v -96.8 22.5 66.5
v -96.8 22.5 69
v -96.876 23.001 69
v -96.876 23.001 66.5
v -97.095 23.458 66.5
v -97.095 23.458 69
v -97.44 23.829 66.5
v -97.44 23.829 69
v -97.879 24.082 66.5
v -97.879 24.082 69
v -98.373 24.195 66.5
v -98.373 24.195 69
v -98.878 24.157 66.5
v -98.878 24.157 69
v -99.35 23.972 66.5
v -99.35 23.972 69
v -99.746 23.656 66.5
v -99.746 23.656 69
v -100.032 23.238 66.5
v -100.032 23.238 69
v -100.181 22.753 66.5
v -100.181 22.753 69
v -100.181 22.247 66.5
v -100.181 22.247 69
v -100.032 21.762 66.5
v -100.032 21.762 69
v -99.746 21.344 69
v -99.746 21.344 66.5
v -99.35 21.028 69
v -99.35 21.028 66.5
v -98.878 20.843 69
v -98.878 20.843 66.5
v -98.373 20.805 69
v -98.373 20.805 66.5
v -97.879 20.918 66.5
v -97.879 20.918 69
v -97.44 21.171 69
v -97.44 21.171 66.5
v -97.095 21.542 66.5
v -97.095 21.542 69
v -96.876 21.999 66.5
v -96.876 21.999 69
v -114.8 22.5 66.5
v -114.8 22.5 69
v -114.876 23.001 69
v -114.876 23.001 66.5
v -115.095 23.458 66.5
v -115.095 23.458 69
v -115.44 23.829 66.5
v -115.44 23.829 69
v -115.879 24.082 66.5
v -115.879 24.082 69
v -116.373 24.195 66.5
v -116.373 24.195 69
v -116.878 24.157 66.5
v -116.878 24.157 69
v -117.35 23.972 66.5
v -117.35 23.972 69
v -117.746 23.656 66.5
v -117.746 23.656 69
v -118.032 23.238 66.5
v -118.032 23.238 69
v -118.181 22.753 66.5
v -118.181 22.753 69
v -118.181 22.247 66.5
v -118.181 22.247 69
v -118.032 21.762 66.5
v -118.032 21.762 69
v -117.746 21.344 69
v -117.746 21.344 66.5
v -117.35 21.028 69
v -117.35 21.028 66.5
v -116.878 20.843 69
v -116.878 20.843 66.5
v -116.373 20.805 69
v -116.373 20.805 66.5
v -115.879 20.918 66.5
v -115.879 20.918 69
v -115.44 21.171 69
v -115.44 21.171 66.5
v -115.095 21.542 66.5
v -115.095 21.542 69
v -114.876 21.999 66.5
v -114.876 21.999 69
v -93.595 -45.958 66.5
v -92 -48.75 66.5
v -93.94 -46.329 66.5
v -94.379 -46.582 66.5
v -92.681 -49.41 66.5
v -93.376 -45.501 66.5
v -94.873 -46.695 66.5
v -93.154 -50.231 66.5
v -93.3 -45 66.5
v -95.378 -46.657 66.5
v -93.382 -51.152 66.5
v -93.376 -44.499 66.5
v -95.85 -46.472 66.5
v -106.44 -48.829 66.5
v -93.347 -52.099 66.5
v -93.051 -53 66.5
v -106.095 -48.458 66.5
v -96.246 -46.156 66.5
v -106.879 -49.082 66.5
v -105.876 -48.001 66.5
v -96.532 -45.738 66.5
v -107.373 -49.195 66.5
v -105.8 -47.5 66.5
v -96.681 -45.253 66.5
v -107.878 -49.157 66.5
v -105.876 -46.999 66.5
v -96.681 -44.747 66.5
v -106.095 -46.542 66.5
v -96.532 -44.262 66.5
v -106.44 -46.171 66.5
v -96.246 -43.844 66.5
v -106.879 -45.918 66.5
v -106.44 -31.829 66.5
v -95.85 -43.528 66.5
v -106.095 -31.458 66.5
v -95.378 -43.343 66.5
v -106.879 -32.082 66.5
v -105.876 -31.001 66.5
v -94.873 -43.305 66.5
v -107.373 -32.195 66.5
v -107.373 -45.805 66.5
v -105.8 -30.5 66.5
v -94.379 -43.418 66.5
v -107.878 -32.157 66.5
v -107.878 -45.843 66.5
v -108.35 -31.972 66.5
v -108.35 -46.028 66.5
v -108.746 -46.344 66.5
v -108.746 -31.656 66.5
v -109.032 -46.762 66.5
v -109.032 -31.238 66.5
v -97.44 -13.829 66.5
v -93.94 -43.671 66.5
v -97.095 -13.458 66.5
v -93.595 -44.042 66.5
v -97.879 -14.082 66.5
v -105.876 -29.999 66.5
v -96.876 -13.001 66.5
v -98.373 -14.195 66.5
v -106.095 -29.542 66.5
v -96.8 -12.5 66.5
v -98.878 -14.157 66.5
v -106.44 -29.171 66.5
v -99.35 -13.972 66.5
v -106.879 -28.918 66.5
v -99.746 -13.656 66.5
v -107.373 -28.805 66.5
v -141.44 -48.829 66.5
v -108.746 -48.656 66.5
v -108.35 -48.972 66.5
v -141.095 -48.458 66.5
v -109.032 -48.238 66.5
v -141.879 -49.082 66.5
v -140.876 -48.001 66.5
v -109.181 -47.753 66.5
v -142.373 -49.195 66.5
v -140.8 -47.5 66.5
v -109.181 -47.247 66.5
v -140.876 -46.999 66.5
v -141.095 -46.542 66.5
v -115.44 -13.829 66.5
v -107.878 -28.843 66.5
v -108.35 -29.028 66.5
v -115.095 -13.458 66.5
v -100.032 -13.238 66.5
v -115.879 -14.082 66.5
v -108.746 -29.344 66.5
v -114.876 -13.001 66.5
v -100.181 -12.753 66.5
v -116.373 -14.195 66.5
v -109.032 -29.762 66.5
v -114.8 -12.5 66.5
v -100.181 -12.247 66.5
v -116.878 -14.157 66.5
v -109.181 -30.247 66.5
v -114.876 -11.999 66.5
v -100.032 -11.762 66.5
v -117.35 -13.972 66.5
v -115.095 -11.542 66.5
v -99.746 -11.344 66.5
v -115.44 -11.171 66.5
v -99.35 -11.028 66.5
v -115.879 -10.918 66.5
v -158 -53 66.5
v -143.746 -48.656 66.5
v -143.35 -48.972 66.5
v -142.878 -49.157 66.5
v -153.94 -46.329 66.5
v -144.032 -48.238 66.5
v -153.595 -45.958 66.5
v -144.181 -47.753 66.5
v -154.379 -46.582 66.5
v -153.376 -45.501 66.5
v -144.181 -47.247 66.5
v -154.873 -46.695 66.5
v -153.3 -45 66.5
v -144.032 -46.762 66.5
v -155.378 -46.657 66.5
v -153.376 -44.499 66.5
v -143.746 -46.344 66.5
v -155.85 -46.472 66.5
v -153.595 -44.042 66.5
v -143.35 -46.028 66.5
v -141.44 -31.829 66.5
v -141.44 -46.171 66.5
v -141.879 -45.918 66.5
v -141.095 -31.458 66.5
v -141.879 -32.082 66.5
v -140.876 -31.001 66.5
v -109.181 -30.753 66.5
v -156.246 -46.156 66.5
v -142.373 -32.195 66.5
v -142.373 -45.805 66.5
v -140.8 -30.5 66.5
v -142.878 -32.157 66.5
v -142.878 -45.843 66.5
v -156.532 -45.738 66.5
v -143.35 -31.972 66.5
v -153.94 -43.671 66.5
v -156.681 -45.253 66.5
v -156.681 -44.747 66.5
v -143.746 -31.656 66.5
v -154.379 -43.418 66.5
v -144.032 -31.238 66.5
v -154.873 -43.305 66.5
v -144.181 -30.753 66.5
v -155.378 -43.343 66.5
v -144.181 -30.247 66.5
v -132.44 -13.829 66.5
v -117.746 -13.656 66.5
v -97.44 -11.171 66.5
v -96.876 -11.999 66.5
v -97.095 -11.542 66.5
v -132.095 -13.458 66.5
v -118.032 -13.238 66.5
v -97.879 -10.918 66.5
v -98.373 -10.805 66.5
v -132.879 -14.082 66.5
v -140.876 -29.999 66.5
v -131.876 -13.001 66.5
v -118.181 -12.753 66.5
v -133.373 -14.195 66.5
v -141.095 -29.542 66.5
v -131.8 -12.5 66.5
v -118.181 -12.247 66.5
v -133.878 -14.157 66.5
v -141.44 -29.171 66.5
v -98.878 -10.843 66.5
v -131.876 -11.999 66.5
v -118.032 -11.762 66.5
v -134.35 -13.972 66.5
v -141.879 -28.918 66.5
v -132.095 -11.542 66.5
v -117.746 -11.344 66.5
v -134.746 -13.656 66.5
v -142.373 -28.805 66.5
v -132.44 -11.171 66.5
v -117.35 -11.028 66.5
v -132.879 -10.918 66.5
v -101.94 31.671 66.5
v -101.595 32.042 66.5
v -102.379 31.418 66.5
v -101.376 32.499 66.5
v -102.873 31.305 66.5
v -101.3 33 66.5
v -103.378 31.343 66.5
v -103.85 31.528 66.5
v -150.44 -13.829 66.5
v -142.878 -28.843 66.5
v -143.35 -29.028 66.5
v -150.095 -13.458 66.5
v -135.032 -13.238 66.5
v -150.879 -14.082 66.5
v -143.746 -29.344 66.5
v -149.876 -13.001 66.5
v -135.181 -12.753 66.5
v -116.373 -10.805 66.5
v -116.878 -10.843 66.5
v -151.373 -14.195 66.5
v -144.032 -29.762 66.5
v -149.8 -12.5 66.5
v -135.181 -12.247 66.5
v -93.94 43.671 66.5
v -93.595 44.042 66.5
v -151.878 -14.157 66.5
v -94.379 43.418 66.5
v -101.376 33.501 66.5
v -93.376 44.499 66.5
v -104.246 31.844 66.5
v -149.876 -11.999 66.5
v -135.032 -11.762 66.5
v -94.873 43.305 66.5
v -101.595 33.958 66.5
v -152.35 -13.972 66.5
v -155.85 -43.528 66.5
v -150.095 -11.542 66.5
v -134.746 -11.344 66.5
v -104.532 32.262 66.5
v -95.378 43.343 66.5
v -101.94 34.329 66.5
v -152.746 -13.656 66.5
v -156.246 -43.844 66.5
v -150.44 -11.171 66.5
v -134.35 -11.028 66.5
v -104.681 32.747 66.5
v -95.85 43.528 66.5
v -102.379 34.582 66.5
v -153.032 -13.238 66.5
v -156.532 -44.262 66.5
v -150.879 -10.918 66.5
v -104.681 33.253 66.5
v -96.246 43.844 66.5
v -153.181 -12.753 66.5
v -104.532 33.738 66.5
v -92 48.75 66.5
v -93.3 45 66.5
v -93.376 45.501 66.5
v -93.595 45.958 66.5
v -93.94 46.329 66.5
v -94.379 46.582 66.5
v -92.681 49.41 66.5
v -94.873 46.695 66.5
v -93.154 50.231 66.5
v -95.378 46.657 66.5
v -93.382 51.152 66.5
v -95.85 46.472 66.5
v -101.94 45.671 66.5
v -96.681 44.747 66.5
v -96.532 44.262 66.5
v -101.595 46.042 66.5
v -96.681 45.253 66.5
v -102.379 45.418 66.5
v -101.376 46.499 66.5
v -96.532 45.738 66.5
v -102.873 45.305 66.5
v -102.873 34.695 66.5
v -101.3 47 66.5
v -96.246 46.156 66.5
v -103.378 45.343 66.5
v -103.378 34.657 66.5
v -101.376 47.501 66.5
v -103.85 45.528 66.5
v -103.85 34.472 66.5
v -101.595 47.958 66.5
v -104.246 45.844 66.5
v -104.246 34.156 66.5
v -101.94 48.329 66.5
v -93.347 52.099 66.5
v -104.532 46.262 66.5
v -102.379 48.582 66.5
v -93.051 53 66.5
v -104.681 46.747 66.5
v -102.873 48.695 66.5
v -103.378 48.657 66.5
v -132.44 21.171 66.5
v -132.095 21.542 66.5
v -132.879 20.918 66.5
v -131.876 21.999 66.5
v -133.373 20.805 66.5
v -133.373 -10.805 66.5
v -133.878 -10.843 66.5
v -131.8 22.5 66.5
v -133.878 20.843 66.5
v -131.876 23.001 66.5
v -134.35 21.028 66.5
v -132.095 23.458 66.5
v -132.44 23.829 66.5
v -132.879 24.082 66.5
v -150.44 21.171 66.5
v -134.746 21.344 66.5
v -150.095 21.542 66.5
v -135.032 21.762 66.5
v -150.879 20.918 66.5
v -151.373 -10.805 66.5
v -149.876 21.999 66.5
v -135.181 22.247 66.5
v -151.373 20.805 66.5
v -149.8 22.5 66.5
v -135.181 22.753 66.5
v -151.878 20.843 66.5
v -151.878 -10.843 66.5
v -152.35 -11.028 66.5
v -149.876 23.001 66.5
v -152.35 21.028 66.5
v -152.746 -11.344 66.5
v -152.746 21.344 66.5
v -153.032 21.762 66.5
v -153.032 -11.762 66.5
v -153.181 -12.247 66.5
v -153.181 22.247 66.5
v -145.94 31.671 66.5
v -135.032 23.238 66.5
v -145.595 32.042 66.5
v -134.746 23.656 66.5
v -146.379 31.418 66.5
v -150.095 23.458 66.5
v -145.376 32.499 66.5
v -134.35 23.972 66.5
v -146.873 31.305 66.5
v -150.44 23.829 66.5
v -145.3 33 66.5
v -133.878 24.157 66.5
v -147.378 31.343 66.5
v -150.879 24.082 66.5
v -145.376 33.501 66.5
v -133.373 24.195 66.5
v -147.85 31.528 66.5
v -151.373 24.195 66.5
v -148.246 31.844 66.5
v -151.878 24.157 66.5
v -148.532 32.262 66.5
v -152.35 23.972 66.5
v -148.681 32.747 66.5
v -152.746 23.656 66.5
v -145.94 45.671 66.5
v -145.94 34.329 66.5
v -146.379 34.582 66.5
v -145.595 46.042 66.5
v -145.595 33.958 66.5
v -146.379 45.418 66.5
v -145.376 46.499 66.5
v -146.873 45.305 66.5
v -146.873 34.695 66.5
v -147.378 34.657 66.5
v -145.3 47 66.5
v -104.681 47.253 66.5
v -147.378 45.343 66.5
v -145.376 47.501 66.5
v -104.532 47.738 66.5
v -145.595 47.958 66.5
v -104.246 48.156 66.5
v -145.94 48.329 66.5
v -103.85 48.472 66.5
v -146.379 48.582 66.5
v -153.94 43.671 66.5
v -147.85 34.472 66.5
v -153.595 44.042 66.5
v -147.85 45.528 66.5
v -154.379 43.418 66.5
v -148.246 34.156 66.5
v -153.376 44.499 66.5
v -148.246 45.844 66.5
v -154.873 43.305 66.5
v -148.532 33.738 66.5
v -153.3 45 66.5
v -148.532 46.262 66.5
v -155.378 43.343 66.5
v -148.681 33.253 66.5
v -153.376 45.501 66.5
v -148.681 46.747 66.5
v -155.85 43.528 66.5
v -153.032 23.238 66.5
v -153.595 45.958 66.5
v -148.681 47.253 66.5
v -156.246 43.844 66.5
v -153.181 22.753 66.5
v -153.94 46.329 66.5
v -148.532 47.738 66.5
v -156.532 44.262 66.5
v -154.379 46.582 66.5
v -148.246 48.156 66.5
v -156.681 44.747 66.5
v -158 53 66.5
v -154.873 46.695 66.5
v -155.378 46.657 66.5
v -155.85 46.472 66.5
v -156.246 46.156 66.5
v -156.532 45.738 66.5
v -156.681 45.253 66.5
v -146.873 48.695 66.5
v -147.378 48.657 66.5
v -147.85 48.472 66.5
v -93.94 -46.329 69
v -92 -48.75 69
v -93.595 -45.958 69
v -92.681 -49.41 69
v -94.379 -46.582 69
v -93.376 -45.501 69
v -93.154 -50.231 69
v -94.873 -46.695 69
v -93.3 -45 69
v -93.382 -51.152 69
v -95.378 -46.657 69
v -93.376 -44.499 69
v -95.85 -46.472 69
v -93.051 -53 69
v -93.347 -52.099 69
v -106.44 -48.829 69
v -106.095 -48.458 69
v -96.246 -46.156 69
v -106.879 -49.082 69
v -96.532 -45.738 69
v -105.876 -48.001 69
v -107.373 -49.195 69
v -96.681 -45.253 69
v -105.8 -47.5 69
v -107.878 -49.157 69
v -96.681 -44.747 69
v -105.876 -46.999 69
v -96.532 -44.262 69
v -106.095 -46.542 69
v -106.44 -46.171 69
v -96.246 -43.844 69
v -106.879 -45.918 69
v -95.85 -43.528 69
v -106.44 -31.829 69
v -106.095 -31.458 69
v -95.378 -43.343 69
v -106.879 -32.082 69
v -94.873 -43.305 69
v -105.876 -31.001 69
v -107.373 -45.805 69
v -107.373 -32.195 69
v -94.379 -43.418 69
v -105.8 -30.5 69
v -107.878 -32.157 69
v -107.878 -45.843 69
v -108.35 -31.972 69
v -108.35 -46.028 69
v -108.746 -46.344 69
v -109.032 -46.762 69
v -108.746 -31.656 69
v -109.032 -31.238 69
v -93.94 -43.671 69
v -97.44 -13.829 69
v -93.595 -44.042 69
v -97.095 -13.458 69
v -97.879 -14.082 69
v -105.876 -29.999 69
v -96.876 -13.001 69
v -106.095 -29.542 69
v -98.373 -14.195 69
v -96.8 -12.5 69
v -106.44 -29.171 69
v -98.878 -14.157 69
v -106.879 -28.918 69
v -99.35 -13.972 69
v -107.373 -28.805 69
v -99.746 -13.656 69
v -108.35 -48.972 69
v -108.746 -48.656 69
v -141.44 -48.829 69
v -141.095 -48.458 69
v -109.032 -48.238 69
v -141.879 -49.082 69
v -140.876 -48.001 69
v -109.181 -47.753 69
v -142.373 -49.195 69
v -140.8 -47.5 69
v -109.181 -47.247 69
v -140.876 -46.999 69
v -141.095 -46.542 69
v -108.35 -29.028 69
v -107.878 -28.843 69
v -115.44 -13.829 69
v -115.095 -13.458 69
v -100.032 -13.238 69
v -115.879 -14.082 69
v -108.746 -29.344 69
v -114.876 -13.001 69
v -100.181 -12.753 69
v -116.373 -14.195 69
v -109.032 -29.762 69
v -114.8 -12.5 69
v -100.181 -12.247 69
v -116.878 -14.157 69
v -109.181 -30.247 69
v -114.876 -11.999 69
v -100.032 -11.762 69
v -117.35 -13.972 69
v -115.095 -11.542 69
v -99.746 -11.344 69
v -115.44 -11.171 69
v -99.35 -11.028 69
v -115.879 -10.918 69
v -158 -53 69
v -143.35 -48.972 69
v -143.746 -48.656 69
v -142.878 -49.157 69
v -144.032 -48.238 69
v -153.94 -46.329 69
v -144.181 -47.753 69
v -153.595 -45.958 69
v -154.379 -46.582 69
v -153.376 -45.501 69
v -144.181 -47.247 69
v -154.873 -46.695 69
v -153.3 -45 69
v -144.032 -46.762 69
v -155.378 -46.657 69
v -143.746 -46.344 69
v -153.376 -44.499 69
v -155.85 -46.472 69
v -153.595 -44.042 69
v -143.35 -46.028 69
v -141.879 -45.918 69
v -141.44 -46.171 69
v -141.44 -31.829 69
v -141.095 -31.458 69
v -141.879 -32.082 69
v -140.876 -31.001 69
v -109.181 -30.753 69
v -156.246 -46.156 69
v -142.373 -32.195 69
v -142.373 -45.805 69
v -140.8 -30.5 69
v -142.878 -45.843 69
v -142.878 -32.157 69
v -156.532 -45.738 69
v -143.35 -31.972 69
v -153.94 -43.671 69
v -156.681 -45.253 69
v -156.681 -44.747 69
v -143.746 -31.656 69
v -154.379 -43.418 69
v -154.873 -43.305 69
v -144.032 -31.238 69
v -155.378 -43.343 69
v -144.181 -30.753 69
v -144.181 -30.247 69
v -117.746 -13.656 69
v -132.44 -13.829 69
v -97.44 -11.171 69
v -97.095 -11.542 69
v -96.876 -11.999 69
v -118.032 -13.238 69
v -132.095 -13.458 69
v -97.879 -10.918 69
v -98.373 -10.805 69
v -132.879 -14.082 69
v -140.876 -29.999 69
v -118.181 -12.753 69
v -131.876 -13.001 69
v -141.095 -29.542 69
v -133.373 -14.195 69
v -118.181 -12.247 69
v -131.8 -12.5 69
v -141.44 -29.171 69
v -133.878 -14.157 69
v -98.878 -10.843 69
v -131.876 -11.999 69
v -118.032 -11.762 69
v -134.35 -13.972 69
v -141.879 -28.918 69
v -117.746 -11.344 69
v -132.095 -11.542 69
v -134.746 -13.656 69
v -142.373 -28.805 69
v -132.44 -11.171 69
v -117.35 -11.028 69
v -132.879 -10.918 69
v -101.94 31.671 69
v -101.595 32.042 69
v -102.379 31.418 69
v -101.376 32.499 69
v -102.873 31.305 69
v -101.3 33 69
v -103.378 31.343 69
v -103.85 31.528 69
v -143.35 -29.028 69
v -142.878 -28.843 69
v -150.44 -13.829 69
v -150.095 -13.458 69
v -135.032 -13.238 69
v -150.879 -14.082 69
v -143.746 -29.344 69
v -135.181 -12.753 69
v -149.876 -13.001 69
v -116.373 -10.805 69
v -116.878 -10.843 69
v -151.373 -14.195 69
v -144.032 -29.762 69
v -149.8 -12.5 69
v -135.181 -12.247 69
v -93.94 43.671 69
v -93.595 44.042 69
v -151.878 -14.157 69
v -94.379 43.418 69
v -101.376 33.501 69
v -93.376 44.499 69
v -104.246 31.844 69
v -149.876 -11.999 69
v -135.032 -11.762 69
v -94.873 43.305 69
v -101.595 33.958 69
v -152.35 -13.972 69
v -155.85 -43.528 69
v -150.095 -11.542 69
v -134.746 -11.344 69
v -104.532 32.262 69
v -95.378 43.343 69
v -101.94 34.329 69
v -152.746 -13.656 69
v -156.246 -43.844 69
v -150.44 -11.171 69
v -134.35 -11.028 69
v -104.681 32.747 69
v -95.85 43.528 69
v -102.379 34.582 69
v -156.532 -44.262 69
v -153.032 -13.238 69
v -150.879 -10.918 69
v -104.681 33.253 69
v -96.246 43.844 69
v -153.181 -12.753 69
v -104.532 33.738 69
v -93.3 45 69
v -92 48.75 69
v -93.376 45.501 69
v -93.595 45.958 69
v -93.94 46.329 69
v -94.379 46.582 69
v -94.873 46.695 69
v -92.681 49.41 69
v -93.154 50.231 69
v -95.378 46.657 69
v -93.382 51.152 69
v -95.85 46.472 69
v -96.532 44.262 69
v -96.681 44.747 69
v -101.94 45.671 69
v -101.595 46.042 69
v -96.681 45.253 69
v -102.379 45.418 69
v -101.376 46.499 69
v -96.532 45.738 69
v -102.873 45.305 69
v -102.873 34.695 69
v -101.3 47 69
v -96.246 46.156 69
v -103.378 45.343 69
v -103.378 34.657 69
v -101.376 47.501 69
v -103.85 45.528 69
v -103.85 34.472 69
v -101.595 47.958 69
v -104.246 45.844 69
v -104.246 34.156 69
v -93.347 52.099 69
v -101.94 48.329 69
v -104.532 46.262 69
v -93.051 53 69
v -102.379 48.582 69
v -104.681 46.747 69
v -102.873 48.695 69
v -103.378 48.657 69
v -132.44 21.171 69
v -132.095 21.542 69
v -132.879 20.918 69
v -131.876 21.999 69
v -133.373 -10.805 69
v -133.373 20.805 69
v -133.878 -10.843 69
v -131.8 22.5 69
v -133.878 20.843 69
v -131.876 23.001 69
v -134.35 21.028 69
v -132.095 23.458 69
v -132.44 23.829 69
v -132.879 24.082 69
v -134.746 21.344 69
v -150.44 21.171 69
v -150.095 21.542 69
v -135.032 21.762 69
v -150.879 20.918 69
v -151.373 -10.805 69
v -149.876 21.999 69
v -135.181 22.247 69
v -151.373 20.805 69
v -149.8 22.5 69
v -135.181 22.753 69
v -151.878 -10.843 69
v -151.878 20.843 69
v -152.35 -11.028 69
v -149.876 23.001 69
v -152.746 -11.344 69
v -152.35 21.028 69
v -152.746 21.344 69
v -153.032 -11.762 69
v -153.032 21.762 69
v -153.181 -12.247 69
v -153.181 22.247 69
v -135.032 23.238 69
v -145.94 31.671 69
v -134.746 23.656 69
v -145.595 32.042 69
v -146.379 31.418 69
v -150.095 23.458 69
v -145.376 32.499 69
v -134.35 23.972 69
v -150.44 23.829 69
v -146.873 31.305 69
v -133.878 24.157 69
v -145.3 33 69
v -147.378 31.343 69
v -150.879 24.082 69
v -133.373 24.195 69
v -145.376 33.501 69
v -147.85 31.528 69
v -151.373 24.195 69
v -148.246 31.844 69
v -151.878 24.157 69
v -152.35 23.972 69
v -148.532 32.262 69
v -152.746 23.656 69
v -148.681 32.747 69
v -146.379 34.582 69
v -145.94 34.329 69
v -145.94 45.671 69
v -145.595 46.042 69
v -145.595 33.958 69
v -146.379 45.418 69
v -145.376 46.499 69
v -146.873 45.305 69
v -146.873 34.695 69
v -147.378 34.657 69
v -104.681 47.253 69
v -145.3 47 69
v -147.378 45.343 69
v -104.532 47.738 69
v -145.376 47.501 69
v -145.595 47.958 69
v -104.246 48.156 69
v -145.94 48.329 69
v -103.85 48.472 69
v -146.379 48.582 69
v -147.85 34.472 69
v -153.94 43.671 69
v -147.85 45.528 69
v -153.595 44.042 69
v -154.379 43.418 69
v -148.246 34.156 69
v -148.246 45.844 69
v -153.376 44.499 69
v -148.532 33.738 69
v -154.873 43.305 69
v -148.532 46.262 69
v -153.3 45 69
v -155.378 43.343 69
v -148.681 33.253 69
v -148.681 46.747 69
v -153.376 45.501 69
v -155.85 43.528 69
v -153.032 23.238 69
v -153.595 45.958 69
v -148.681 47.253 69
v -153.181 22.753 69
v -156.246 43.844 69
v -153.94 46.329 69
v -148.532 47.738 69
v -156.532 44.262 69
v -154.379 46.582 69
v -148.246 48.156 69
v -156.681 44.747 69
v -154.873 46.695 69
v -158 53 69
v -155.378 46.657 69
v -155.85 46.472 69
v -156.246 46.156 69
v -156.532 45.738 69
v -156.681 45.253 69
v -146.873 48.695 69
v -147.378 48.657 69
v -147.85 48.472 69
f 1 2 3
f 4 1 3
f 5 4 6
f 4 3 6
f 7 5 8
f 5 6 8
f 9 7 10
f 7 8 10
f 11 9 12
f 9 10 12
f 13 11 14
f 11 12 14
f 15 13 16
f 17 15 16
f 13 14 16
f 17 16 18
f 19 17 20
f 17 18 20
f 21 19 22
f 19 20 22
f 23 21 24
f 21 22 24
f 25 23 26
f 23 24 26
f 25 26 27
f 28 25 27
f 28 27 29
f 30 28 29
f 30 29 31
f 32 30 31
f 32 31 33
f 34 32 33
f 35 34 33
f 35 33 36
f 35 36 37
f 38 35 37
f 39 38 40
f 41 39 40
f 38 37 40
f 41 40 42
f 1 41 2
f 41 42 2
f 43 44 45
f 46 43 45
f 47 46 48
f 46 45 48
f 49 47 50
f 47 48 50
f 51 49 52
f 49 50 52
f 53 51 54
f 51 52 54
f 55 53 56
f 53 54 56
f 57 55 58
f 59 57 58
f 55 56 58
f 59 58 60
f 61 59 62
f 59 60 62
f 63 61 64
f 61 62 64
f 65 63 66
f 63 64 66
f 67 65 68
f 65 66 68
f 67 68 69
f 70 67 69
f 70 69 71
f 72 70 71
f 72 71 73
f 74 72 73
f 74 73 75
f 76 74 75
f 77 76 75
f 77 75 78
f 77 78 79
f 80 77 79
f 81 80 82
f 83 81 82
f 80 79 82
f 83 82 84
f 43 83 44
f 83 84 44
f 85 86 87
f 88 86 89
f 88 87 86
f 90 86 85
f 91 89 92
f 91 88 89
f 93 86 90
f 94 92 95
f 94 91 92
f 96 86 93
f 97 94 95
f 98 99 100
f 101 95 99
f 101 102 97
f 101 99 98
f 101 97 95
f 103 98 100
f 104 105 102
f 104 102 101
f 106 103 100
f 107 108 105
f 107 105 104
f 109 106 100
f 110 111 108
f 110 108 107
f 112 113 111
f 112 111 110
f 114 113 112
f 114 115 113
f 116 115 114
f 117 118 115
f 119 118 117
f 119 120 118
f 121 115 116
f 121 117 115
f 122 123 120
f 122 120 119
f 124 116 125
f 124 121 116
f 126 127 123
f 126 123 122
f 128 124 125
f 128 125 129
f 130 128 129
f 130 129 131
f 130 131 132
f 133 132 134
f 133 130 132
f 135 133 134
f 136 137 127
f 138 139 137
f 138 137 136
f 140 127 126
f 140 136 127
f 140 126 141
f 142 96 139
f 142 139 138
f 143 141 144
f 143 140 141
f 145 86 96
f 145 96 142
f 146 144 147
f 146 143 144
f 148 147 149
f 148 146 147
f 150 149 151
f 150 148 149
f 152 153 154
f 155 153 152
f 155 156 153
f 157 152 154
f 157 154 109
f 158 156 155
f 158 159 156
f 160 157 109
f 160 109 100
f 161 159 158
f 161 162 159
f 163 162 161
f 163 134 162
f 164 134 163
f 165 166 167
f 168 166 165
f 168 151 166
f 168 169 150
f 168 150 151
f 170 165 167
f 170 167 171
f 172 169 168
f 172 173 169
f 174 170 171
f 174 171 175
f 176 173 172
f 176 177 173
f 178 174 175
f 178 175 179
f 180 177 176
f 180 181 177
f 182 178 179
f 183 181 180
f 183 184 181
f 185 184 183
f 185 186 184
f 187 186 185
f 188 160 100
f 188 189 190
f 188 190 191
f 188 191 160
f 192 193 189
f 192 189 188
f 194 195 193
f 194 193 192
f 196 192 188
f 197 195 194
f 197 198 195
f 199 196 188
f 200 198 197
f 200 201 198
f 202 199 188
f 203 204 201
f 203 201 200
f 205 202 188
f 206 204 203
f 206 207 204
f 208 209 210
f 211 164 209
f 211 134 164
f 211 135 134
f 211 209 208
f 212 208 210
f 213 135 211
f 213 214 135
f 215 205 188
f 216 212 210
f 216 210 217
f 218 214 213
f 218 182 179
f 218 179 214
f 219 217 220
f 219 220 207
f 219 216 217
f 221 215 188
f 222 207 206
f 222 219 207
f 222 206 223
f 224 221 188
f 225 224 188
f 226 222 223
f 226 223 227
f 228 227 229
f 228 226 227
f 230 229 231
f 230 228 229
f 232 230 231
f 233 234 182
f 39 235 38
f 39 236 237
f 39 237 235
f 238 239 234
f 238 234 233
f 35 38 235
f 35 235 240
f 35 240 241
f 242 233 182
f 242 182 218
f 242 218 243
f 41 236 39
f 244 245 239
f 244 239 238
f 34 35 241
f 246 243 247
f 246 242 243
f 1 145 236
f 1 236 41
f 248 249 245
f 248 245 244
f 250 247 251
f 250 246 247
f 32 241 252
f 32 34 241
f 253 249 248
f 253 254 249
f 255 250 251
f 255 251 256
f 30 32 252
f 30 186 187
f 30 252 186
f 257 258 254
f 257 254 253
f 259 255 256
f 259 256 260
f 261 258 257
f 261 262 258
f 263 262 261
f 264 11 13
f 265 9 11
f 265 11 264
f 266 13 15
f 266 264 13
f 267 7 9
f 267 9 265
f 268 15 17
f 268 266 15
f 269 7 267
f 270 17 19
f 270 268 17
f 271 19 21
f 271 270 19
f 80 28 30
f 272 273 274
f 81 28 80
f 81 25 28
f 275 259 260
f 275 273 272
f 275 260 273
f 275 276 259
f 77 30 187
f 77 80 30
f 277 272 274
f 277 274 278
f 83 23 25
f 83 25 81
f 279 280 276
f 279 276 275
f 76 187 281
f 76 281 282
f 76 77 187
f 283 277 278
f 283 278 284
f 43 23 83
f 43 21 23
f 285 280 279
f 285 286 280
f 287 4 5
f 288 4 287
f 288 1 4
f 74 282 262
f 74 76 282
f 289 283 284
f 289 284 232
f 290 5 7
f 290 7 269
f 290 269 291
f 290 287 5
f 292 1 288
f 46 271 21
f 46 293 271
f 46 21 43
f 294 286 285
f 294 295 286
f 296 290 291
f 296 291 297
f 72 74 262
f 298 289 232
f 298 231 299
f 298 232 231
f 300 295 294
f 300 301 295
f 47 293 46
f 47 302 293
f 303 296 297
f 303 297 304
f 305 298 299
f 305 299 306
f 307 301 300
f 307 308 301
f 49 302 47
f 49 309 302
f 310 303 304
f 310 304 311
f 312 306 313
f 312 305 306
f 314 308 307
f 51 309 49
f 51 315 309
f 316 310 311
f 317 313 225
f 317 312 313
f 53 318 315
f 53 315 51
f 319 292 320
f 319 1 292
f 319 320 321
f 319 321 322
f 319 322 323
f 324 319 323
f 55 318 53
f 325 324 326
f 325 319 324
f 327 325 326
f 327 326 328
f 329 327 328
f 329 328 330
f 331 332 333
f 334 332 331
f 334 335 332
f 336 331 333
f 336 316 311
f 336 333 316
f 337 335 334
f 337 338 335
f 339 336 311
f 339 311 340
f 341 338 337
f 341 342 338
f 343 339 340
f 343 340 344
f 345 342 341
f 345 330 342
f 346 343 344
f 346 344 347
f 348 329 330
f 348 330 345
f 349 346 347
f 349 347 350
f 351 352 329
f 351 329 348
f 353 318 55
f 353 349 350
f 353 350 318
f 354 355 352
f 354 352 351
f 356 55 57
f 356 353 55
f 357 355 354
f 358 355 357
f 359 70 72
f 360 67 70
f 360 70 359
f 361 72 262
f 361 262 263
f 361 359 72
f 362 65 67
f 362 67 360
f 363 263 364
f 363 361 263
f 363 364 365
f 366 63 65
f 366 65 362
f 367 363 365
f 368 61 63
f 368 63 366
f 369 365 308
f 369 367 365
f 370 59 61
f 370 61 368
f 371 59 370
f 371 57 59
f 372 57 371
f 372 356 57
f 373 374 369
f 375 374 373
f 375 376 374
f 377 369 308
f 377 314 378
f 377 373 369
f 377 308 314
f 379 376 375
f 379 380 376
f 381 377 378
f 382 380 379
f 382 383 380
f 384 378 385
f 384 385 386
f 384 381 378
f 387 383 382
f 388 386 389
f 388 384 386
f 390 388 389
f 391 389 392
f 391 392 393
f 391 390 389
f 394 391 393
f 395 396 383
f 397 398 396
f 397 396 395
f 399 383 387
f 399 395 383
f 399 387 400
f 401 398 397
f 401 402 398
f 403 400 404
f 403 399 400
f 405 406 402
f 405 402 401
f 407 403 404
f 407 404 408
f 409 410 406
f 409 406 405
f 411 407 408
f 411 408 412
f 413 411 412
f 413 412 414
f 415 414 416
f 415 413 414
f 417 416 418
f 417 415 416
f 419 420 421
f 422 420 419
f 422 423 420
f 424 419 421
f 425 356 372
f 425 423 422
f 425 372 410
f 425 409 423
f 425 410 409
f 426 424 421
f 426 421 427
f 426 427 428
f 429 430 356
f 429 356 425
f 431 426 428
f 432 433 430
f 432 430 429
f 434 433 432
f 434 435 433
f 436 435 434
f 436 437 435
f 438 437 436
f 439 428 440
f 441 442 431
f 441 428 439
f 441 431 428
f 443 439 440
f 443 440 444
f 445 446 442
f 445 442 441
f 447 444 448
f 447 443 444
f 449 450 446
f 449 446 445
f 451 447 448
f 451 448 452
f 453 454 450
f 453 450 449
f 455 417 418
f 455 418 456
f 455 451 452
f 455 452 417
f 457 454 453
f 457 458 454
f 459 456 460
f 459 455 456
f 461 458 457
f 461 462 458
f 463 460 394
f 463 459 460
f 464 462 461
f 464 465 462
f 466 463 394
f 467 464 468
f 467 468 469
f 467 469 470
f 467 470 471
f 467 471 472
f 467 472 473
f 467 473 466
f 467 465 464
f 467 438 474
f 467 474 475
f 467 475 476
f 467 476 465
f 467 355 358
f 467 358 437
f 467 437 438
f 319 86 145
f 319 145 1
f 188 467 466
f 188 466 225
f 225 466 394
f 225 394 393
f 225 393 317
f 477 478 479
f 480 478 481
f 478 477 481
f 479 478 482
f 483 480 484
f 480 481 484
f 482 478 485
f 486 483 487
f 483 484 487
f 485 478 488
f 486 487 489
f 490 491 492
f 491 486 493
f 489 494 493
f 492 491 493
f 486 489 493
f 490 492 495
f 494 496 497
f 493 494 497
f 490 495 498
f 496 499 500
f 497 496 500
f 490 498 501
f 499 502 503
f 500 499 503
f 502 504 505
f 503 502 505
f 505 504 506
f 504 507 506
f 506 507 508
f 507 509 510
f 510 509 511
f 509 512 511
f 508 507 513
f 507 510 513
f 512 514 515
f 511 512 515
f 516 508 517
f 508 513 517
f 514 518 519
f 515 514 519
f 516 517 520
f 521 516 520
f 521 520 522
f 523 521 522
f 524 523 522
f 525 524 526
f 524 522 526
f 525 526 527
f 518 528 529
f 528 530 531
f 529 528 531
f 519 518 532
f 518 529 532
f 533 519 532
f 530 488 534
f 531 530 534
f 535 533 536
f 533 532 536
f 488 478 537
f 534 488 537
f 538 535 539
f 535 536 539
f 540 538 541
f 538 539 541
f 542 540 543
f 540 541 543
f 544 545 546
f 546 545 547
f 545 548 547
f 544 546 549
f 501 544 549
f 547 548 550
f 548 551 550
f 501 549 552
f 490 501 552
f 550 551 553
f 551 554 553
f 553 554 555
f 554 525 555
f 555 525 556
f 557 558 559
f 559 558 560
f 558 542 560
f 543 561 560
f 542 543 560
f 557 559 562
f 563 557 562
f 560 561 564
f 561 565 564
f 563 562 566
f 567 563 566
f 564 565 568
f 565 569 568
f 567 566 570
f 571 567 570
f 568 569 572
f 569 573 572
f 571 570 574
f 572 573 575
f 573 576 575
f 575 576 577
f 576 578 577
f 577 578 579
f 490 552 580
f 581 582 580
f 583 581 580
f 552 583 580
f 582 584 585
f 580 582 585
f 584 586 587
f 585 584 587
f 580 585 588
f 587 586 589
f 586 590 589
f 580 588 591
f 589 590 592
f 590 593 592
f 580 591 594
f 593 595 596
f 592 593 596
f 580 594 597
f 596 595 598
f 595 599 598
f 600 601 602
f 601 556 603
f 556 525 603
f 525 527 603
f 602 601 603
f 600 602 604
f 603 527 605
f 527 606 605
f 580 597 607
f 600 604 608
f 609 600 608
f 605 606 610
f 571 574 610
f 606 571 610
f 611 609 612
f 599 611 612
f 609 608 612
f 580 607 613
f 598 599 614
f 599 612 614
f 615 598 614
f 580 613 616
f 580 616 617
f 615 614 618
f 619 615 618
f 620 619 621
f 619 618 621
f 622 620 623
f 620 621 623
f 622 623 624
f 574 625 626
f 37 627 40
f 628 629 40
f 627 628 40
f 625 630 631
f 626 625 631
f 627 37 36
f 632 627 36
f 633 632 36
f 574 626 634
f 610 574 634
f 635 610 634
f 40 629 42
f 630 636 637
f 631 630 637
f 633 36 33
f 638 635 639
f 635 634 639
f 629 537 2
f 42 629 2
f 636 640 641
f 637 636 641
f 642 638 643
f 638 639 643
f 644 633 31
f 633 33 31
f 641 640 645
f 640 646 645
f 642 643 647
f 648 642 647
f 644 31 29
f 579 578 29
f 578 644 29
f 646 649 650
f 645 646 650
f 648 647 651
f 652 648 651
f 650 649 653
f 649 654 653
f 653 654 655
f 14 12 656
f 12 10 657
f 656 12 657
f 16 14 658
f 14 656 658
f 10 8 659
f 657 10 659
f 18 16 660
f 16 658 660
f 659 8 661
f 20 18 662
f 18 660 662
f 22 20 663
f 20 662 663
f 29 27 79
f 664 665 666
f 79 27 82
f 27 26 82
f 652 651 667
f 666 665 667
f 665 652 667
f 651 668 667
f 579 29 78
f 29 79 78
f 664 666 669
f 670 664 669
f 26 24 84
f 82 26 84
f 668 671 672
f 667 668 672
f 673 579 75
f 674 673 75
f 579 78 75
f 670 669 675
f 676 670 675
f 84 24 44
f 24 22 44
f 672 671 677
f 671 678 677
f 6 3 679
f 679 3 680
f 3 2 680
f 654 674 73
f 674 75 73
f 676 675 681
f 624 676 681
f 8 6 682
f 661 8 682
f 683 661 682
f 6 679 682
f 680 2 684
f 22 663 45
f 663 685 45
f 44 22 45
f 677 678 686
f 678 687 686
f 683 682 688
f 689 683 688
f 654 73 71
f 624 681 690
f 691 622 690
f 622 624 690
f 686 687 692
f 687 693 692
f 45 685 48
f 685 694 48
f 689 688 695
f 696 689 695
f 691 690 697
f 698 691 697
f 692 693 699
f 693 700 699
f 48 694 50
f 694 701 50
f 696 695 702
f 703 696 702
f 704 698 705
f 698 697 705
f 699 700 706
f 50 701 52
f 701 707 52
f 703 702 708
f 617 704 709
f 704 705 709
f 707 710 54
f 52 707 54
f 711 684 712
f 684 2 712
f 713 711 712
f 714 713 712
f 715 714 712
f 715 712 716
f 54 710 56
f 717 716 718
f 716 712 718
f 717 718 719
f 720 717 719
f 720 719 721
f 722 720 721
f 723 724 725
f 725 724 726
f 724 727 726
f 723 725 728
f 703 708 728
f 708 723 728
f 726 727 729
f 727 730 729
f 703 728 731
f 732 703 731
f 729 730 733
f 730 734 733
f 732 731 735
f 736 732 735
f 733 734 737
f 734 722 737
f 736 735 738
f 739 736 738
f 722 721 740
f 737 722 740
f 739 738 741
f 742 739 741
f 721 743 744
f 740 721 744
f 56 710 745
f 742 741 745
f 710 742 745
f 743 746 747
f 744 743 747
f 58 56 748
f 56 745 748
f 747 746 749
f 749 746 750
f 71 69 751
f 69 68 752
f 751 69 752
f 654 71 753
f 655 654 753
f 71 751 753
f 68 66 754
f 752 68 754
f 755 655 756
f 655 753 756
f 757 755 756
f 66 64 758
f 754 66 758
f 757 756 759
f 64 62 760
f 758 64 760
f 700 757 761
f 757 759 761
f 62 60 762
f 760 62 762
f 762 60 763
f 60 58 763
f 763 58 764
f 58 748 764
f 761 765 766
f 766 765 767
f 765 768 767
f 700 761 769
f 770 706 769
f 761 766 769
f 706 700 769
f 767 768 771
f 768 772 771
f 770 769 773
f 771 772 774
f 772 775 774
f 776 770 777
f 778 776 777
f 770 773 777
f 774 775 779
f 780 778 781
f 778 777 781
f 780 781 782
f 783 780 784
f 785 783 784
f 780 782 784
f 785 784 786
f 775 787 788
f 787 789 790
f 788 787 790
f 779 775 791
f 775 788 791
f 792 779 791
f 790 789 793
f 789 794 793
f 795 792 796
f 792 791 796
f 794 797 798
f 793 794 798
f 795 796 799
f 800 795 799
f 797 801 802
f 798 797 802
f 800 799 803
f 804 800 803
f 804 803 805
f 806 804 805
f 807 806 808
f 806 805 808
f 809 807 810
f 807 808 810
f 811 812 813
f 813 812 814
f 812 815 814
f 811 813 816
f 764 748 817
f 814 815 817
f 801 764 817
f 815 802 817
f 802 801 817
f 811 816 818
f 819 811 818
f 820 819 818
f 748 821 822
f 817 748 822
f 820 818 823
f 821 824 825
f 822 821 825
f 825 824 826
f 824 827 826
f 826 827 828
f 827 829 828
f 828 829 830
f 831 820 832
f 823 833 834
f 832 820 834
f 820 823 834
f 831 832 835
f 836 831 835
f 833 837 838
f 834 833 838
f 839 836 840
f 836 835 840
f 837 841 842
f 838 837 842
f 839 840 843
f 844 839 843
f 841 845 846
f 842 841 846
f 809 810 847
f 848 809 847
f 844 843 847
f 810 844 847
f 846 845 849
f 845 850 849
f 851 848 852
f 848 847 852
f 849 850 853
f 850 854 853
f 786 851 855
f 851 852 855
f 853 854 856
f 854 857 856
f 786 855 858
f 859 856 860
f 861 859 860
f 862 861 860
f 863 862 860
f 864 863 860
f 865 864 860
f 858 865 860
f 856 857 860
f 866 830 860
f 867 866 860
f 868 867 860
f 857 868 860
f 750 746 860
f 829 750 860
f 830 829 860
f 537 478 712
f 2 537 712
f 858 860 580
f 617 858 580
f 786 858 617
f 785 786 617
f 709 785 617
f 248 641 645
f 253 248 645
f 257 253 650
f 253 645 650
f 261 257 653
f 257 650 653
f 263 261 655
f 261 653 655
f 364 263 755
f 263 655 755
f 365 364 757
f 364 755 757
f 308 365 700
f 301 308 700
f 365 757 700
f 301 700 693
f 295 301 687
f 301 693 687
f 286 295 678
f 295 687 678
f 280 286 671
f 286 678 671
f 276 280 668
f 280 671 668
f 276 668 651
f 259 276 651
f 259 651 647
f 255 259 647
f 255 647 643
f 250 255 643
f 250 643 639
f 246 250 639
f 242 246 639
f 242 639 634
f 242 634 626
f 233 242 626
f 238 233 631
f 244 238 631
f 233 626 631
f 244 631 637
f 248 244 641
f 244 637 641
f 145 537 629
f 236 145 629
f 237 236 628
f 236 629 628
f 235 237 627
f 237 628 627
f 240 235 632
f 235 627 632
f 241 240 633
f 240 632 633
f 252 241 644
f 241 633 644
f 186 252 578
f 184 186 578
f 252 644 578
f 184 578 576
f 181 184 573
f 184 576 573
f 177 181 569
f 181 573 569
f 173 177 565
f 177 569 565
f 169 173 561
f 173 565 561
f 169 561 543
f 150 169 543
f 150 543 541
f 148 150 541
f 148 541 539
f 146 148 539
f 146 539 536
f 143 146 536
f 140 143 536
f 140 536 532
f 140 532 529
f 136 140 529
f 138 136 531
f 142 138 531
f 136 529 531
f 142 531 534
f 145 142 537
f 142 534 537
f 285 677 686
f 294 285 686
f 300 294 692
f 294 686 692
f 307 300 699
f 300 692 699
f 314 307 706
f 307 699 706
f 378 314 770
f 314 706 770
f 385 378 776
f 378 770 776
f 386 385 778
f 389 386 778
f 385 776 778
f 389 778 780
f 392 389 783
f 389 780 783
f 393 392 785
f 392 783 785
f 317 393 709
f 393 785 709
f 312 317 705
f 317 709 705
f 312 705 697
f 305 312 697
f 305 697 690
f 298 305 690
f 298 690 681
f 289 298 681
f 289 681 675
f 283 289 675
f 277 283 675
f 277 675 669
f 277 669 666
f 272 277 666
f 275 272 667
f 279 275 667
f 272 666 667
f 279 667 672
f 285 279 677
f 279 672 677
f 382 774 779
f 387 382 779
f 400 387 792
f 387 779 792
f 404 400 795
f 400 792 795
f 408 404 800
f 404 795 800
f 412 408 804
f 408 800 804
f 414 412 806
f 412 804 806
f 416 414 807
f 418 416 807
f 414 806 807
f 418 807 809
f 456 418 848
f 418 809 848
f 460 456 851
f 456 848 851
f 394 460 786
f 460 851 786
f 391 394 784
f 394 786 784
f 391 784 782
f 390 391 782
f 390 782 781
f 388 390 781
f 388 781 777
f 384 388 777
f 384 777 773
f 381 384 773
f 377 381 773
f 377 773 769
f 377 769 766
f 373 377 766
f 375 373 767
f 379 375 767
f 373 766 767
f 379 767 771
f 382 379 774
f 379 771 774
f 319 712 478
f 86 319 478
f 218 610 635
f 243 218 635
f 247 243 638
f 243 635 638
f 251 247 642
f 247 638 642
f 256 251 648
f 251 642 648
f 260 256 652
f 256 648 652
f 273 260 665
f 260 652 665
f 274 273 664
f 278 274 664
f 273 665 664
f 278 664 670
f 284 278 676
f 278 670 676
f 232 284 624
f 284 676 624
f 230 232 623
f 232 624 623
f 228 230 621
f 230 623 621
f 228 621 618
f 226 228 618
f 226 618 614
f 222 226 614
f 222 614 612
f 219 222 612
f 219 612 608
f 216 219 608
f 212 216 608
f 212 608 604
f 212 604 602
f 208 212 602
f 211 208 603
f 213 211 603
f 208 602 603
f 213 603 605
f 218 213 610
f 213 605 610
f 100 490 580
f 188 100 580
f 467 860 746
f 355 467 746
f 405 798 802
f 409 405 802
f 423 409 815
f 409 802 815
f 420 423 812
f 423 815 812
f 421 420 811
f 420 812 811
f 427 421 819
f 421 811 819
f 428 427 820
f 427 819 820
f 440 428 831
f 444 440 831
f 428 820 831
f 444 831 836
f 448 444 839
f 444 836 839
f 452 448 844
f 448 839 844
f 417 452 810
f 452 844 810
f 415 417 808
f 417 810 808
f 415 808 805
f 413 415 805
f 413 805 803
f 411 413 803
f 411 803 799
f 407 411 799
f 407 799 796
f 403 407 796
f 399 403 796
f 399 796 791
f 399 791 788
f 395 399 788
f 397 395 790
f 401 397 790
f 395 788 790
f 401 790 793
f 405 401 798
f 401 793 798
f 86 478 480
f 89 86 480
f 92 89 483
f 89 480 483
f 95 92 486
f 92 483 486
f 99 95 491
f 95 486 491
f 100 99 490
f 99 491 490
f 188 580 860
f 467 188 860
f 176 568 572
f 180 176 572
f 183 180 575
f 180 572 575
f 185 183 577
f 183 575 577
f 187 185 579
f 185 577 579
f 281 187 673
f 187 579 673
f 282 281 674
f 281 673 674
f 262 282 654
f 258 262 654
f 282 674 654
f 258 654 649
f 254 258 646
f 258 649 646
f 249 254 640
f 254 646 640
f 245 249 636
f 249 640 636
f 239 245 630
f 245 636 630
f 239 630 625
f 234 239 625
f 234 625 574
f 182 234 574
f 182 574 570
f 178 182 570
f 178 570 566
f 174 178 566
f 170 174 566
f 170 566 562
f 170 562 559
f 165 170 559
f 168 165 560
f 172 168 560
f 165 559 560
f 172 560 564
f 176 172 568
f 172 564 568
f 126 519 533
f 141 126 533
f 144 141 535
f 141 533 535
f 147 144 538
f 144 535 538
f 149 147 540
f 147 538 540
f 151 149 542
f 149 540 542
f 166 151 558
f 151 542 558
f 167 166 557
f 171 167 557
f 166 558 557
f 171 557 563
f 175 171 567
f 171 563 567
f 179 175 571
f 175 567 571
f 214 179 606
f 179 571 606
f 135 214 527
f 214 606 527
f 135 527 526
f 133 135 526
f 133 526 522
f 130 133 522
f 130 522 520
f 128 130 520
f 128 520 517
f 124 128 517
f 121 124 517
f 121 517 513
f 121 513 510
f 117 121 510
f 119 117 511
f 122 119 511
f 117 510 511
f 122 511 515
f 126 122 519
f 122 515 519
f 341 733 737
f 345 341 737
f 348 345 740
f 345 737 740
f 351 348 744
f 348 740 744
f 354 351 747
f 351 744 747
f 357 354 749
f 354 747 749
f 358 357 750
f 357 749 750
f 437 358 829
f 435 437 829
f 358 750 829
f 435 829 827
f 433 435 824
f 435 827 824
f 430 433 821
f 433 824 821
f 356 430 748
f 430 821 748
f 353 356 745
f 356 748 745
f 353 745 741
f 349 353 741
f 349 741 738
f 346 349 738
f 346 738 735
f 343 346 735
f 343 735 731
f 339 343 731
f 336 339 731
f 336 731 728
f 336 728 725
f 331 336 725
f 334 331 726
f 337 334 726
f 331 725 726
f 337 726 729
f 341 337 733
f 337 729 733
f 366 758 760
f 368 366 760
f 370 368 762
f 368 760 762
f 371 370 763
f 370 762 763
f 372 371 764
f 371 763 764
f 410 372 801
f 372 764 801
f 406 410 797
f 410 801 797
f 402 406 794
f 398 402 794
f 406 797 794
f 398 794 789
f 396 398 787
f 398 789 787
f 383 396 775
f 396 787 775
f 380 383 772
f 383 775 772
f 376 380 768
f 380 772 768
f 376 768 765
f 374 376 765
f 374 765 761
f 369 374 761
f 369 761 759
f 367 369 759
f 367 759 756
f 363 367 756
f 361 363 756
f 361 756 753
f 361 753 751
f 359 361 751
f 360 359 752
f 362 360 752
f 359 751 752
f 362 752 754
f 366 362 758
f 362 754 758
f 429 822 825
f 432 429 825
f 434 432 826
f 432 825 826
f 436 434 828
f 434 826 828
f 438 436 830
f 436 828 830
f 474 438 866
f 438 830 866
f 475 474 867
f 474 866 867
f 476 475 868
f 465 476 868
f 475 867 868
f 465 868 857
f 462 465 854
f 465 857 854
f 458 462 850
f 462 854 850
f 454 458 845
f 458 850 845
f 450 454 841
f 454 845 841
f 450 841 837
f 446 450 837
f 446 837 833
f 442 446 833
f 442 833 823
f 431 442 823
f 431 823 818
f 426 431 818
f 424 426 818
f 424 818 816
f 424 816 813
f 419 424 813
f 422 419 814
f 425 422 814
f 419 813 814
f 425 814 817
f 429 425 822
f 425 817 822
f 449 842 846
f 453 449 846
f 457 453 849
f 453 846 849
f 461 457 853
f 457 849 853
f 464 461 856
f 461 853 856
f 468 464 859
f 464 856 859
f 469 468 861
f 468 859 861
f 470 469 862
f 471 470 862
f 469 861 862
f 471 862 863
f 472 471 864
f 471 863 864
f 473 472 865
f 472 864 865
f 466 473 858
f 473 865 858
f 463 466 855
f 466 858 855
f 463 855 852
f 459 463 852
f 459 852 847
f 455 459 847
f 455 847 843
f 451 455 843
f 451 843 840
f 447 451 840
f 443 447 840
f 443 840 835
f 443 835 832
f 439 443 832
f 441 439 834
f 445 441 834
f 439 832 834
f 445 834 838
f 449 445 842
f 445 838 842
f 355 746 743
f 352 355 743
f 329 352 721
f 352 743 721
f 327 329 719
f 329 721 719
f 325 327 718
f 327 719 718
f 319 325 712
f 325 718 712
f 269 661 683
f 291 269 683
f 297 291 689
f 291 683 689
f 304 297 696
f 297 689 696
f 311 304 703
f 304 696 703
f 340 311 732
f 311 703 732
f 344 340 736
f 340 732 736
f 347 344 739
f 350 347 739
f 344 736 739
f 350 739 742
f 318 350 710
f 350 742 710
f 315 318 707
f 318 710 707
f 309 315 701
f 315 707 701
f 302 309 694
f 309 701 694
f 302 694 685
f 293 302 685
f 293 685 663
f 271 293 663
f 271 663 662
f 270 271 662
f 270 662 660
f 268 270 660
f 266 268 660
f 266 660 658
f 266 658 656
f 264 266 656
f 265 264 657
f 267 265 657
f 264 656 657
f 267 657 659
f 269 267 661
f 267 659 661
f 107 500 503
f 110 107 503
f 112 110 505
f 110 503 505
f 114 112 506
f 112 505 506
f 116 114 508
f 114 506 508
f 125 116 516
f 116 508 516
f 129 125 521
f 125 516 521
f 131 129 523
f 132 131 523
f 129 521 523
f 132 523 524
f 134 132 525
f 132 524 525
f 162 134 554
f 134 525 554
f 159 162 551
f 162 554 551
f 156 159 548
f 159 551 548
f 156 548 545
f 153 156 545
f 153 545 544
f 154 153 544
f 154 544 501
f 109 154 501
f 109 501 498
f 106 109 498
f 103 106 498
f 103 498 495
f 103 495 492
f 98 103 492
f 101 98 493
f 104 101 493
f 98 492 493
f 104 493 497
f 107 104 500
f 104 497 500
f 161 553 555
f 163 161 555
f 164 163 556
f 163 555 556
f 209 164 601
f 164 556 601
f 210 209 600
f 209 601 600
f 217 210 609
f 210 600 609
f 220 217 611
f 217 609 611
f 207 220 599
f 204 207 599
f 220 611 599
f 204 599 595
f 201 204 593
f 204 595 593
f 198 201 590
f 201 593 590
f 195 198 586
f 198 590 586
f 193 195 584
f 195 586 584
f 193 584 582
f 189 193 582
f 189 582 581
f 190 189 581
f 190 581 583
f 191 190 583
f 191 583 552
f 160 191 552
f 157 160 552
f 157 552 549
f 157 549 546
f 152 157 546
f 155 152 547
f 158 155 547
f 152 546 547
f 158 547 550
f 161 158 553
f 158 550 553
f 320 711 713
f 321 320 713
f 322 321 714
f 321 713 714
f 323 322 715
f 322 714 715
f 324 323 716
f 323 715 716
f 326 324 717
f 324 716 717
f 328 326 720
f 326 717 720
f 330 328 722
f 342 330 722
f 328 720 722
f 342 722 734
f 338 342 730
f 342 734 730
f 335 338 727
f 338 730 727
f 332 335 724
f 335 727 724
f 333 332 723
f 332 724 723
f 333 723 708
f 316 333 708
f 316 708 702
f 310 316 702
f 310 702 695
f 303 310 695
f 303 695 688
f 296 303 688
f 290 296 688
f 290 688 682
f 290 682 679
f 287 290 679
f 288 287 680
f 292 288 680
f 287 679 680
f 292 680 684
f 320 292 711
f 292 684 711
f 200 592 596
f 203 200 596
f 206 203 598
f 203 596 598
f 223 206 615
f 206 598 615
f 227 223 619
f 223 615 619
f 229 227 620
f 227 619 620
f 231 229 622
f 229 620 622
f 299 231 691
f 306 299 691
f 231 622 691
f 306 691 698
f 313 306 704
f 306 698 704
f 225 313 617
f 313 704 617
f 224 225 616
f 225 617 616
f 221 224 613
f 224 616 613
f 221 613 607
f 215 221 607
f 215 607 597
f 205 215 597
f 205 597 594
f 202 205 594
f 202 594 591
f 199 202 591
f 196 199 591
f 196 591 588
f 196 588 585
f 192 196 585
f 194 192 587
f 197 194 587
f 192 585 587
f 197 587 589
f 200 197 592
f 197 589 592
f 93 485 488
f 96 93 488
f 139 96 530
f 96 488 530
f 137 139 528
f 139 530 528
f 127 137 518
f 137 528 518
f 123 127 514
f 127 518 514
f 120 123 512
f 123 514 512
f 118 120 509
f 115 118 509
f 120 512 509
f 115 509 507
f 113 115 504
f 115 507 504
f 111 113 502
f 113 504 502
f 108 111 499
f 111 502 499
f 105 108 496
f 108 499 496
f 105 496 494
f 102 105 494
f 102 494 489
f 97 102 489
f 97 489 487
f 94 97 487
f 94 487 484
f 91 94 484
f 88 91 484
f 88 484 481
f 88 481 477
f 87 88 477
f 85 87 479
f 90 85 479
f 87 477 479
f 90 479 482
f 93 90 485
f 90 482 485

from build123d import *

# Parameters (mm, degrees)
MAIN_PROFILE_SKETCH_R = 1.7
MAIN_EXTRUSION_DEPTH  = 2.5


with BuildPart() as part:
    # Main Profile Sketch → Main Extrusion (new body)
    with BuildSketch(Plane.XY.offset(69)):
        with BuildLine():
            Line((-158, 53), (-93.05122926, 53))
            ThreePointArc((-93.05122926, 53), (-93.300513342, 50.683537094), (-92, 48.750454583))
            Line((-92, 48.750454583), (-92, -48.750454583))
            ThreePointArc((-92, -48.750454583), (-93.300513342, -50.683537094), (-93.05122926, -53))
            Line((-93.05122926, -53), (-158, -53))
            Line((-158, -53), (-158, 53))
        make_face()
        with Locations((-155, -45)):
            Circle(MAIN_PROFILE_SKETCH_R, mode=Mode.SUBTRACT)
        with Locations((-142.5, -47.5)):
            Circle(MAIN_PROFILE_SKETCH_R, mode=Mode.SUBTRACT)
        with Locations((-142.5, -30.5)):
            Circle(MAIN_PROFILE_SKETCH_R, mode=Mode.SUBTRACT)
        with Locations((-151.5, -12.5)):
            Circle(MAIN_PROFILE_SKETCH_R, mode=Mode.SUBTRACT)
        with Locations((-133.5, -12.5)):
            Circle(MAIN_PROFILE_SKETCH_R, mode=Mode.SUBTRACT)
        with Locations((-107.5, -47.5)):
            Circle(MAIN_PROFILE_SKETCH_R, mode=Mode.SUBTRACT)
        with Locations((-95, -45)):
            Circle(MAIN_PROFILE_SKETCH_R, mode=Mode.SUBTRACT)
        with Locations((-107.5, -30.5)):
            Circle(MAIN_PROFILE_SKETCH_R, mode=Mode.SUBTRACT)
        with Locations((-116.5, -12.5)):
            Circle(MAIN_PROFILE_SKETCH_R, mode=Mode.SUBTRACT)
        with Locations((-98.5, -12.5)):
            Circle(MAIN_PROFILE_SKETCH_R, mode=Mode.SUBTRACT)
        with Locations((-151.5, 22.5)):
            Circle(MAIN_PROFILE_SKETCH_R, mode=Mode.SUBTRACT)
        with Locations((-133.5, 22.5)):
            Circle(MAIN_PROFILE_SKETCH_R, mode=Mode.SUBTRACT)
        with Locations((-147, 33)):
            Circle(MAIN_PROFILE_SKETCH_R, mode=Mode.SUBTRACT)
        with Locations((-155, 45)):
            Circle(MAIN_PROFILE_SKETCH_R, mode=Mode.SUBTRACT)
        with Locations((-147, 47)):
            Circle(MAIN_PROFILE_SKETCH_R, mode=Mode.SUBTRACT)
        with Locations((-116.5, 22.5)):
            Circle(MAIN_PROFILE_SKETCH_R, mode=Mode.SUBTRACT)
        with Locations((-98.5, 22.5)):
            Circle(MAIN_PROFILE_SKETCH_R, mode=Mode.SUBTRACT)
        with Locations((-103, 33)):
            Circle(MAIN_PROFILE_SKETCH_R, mode=Mode.SUBTRACT)
        with Locations((-103, 47)):
            Circle(MAIN_PROFILE_SKETCH_R, mode=Mode.SUBTRACT)
        with Locations((-95, 45)):
            Circle(MAIN_PROFILE_SKETCH_R, mode=Mode.SUBTRACT)
    extrude(amount=-MAIN_EXTRUSION_DEPTH)


solid = part.part
